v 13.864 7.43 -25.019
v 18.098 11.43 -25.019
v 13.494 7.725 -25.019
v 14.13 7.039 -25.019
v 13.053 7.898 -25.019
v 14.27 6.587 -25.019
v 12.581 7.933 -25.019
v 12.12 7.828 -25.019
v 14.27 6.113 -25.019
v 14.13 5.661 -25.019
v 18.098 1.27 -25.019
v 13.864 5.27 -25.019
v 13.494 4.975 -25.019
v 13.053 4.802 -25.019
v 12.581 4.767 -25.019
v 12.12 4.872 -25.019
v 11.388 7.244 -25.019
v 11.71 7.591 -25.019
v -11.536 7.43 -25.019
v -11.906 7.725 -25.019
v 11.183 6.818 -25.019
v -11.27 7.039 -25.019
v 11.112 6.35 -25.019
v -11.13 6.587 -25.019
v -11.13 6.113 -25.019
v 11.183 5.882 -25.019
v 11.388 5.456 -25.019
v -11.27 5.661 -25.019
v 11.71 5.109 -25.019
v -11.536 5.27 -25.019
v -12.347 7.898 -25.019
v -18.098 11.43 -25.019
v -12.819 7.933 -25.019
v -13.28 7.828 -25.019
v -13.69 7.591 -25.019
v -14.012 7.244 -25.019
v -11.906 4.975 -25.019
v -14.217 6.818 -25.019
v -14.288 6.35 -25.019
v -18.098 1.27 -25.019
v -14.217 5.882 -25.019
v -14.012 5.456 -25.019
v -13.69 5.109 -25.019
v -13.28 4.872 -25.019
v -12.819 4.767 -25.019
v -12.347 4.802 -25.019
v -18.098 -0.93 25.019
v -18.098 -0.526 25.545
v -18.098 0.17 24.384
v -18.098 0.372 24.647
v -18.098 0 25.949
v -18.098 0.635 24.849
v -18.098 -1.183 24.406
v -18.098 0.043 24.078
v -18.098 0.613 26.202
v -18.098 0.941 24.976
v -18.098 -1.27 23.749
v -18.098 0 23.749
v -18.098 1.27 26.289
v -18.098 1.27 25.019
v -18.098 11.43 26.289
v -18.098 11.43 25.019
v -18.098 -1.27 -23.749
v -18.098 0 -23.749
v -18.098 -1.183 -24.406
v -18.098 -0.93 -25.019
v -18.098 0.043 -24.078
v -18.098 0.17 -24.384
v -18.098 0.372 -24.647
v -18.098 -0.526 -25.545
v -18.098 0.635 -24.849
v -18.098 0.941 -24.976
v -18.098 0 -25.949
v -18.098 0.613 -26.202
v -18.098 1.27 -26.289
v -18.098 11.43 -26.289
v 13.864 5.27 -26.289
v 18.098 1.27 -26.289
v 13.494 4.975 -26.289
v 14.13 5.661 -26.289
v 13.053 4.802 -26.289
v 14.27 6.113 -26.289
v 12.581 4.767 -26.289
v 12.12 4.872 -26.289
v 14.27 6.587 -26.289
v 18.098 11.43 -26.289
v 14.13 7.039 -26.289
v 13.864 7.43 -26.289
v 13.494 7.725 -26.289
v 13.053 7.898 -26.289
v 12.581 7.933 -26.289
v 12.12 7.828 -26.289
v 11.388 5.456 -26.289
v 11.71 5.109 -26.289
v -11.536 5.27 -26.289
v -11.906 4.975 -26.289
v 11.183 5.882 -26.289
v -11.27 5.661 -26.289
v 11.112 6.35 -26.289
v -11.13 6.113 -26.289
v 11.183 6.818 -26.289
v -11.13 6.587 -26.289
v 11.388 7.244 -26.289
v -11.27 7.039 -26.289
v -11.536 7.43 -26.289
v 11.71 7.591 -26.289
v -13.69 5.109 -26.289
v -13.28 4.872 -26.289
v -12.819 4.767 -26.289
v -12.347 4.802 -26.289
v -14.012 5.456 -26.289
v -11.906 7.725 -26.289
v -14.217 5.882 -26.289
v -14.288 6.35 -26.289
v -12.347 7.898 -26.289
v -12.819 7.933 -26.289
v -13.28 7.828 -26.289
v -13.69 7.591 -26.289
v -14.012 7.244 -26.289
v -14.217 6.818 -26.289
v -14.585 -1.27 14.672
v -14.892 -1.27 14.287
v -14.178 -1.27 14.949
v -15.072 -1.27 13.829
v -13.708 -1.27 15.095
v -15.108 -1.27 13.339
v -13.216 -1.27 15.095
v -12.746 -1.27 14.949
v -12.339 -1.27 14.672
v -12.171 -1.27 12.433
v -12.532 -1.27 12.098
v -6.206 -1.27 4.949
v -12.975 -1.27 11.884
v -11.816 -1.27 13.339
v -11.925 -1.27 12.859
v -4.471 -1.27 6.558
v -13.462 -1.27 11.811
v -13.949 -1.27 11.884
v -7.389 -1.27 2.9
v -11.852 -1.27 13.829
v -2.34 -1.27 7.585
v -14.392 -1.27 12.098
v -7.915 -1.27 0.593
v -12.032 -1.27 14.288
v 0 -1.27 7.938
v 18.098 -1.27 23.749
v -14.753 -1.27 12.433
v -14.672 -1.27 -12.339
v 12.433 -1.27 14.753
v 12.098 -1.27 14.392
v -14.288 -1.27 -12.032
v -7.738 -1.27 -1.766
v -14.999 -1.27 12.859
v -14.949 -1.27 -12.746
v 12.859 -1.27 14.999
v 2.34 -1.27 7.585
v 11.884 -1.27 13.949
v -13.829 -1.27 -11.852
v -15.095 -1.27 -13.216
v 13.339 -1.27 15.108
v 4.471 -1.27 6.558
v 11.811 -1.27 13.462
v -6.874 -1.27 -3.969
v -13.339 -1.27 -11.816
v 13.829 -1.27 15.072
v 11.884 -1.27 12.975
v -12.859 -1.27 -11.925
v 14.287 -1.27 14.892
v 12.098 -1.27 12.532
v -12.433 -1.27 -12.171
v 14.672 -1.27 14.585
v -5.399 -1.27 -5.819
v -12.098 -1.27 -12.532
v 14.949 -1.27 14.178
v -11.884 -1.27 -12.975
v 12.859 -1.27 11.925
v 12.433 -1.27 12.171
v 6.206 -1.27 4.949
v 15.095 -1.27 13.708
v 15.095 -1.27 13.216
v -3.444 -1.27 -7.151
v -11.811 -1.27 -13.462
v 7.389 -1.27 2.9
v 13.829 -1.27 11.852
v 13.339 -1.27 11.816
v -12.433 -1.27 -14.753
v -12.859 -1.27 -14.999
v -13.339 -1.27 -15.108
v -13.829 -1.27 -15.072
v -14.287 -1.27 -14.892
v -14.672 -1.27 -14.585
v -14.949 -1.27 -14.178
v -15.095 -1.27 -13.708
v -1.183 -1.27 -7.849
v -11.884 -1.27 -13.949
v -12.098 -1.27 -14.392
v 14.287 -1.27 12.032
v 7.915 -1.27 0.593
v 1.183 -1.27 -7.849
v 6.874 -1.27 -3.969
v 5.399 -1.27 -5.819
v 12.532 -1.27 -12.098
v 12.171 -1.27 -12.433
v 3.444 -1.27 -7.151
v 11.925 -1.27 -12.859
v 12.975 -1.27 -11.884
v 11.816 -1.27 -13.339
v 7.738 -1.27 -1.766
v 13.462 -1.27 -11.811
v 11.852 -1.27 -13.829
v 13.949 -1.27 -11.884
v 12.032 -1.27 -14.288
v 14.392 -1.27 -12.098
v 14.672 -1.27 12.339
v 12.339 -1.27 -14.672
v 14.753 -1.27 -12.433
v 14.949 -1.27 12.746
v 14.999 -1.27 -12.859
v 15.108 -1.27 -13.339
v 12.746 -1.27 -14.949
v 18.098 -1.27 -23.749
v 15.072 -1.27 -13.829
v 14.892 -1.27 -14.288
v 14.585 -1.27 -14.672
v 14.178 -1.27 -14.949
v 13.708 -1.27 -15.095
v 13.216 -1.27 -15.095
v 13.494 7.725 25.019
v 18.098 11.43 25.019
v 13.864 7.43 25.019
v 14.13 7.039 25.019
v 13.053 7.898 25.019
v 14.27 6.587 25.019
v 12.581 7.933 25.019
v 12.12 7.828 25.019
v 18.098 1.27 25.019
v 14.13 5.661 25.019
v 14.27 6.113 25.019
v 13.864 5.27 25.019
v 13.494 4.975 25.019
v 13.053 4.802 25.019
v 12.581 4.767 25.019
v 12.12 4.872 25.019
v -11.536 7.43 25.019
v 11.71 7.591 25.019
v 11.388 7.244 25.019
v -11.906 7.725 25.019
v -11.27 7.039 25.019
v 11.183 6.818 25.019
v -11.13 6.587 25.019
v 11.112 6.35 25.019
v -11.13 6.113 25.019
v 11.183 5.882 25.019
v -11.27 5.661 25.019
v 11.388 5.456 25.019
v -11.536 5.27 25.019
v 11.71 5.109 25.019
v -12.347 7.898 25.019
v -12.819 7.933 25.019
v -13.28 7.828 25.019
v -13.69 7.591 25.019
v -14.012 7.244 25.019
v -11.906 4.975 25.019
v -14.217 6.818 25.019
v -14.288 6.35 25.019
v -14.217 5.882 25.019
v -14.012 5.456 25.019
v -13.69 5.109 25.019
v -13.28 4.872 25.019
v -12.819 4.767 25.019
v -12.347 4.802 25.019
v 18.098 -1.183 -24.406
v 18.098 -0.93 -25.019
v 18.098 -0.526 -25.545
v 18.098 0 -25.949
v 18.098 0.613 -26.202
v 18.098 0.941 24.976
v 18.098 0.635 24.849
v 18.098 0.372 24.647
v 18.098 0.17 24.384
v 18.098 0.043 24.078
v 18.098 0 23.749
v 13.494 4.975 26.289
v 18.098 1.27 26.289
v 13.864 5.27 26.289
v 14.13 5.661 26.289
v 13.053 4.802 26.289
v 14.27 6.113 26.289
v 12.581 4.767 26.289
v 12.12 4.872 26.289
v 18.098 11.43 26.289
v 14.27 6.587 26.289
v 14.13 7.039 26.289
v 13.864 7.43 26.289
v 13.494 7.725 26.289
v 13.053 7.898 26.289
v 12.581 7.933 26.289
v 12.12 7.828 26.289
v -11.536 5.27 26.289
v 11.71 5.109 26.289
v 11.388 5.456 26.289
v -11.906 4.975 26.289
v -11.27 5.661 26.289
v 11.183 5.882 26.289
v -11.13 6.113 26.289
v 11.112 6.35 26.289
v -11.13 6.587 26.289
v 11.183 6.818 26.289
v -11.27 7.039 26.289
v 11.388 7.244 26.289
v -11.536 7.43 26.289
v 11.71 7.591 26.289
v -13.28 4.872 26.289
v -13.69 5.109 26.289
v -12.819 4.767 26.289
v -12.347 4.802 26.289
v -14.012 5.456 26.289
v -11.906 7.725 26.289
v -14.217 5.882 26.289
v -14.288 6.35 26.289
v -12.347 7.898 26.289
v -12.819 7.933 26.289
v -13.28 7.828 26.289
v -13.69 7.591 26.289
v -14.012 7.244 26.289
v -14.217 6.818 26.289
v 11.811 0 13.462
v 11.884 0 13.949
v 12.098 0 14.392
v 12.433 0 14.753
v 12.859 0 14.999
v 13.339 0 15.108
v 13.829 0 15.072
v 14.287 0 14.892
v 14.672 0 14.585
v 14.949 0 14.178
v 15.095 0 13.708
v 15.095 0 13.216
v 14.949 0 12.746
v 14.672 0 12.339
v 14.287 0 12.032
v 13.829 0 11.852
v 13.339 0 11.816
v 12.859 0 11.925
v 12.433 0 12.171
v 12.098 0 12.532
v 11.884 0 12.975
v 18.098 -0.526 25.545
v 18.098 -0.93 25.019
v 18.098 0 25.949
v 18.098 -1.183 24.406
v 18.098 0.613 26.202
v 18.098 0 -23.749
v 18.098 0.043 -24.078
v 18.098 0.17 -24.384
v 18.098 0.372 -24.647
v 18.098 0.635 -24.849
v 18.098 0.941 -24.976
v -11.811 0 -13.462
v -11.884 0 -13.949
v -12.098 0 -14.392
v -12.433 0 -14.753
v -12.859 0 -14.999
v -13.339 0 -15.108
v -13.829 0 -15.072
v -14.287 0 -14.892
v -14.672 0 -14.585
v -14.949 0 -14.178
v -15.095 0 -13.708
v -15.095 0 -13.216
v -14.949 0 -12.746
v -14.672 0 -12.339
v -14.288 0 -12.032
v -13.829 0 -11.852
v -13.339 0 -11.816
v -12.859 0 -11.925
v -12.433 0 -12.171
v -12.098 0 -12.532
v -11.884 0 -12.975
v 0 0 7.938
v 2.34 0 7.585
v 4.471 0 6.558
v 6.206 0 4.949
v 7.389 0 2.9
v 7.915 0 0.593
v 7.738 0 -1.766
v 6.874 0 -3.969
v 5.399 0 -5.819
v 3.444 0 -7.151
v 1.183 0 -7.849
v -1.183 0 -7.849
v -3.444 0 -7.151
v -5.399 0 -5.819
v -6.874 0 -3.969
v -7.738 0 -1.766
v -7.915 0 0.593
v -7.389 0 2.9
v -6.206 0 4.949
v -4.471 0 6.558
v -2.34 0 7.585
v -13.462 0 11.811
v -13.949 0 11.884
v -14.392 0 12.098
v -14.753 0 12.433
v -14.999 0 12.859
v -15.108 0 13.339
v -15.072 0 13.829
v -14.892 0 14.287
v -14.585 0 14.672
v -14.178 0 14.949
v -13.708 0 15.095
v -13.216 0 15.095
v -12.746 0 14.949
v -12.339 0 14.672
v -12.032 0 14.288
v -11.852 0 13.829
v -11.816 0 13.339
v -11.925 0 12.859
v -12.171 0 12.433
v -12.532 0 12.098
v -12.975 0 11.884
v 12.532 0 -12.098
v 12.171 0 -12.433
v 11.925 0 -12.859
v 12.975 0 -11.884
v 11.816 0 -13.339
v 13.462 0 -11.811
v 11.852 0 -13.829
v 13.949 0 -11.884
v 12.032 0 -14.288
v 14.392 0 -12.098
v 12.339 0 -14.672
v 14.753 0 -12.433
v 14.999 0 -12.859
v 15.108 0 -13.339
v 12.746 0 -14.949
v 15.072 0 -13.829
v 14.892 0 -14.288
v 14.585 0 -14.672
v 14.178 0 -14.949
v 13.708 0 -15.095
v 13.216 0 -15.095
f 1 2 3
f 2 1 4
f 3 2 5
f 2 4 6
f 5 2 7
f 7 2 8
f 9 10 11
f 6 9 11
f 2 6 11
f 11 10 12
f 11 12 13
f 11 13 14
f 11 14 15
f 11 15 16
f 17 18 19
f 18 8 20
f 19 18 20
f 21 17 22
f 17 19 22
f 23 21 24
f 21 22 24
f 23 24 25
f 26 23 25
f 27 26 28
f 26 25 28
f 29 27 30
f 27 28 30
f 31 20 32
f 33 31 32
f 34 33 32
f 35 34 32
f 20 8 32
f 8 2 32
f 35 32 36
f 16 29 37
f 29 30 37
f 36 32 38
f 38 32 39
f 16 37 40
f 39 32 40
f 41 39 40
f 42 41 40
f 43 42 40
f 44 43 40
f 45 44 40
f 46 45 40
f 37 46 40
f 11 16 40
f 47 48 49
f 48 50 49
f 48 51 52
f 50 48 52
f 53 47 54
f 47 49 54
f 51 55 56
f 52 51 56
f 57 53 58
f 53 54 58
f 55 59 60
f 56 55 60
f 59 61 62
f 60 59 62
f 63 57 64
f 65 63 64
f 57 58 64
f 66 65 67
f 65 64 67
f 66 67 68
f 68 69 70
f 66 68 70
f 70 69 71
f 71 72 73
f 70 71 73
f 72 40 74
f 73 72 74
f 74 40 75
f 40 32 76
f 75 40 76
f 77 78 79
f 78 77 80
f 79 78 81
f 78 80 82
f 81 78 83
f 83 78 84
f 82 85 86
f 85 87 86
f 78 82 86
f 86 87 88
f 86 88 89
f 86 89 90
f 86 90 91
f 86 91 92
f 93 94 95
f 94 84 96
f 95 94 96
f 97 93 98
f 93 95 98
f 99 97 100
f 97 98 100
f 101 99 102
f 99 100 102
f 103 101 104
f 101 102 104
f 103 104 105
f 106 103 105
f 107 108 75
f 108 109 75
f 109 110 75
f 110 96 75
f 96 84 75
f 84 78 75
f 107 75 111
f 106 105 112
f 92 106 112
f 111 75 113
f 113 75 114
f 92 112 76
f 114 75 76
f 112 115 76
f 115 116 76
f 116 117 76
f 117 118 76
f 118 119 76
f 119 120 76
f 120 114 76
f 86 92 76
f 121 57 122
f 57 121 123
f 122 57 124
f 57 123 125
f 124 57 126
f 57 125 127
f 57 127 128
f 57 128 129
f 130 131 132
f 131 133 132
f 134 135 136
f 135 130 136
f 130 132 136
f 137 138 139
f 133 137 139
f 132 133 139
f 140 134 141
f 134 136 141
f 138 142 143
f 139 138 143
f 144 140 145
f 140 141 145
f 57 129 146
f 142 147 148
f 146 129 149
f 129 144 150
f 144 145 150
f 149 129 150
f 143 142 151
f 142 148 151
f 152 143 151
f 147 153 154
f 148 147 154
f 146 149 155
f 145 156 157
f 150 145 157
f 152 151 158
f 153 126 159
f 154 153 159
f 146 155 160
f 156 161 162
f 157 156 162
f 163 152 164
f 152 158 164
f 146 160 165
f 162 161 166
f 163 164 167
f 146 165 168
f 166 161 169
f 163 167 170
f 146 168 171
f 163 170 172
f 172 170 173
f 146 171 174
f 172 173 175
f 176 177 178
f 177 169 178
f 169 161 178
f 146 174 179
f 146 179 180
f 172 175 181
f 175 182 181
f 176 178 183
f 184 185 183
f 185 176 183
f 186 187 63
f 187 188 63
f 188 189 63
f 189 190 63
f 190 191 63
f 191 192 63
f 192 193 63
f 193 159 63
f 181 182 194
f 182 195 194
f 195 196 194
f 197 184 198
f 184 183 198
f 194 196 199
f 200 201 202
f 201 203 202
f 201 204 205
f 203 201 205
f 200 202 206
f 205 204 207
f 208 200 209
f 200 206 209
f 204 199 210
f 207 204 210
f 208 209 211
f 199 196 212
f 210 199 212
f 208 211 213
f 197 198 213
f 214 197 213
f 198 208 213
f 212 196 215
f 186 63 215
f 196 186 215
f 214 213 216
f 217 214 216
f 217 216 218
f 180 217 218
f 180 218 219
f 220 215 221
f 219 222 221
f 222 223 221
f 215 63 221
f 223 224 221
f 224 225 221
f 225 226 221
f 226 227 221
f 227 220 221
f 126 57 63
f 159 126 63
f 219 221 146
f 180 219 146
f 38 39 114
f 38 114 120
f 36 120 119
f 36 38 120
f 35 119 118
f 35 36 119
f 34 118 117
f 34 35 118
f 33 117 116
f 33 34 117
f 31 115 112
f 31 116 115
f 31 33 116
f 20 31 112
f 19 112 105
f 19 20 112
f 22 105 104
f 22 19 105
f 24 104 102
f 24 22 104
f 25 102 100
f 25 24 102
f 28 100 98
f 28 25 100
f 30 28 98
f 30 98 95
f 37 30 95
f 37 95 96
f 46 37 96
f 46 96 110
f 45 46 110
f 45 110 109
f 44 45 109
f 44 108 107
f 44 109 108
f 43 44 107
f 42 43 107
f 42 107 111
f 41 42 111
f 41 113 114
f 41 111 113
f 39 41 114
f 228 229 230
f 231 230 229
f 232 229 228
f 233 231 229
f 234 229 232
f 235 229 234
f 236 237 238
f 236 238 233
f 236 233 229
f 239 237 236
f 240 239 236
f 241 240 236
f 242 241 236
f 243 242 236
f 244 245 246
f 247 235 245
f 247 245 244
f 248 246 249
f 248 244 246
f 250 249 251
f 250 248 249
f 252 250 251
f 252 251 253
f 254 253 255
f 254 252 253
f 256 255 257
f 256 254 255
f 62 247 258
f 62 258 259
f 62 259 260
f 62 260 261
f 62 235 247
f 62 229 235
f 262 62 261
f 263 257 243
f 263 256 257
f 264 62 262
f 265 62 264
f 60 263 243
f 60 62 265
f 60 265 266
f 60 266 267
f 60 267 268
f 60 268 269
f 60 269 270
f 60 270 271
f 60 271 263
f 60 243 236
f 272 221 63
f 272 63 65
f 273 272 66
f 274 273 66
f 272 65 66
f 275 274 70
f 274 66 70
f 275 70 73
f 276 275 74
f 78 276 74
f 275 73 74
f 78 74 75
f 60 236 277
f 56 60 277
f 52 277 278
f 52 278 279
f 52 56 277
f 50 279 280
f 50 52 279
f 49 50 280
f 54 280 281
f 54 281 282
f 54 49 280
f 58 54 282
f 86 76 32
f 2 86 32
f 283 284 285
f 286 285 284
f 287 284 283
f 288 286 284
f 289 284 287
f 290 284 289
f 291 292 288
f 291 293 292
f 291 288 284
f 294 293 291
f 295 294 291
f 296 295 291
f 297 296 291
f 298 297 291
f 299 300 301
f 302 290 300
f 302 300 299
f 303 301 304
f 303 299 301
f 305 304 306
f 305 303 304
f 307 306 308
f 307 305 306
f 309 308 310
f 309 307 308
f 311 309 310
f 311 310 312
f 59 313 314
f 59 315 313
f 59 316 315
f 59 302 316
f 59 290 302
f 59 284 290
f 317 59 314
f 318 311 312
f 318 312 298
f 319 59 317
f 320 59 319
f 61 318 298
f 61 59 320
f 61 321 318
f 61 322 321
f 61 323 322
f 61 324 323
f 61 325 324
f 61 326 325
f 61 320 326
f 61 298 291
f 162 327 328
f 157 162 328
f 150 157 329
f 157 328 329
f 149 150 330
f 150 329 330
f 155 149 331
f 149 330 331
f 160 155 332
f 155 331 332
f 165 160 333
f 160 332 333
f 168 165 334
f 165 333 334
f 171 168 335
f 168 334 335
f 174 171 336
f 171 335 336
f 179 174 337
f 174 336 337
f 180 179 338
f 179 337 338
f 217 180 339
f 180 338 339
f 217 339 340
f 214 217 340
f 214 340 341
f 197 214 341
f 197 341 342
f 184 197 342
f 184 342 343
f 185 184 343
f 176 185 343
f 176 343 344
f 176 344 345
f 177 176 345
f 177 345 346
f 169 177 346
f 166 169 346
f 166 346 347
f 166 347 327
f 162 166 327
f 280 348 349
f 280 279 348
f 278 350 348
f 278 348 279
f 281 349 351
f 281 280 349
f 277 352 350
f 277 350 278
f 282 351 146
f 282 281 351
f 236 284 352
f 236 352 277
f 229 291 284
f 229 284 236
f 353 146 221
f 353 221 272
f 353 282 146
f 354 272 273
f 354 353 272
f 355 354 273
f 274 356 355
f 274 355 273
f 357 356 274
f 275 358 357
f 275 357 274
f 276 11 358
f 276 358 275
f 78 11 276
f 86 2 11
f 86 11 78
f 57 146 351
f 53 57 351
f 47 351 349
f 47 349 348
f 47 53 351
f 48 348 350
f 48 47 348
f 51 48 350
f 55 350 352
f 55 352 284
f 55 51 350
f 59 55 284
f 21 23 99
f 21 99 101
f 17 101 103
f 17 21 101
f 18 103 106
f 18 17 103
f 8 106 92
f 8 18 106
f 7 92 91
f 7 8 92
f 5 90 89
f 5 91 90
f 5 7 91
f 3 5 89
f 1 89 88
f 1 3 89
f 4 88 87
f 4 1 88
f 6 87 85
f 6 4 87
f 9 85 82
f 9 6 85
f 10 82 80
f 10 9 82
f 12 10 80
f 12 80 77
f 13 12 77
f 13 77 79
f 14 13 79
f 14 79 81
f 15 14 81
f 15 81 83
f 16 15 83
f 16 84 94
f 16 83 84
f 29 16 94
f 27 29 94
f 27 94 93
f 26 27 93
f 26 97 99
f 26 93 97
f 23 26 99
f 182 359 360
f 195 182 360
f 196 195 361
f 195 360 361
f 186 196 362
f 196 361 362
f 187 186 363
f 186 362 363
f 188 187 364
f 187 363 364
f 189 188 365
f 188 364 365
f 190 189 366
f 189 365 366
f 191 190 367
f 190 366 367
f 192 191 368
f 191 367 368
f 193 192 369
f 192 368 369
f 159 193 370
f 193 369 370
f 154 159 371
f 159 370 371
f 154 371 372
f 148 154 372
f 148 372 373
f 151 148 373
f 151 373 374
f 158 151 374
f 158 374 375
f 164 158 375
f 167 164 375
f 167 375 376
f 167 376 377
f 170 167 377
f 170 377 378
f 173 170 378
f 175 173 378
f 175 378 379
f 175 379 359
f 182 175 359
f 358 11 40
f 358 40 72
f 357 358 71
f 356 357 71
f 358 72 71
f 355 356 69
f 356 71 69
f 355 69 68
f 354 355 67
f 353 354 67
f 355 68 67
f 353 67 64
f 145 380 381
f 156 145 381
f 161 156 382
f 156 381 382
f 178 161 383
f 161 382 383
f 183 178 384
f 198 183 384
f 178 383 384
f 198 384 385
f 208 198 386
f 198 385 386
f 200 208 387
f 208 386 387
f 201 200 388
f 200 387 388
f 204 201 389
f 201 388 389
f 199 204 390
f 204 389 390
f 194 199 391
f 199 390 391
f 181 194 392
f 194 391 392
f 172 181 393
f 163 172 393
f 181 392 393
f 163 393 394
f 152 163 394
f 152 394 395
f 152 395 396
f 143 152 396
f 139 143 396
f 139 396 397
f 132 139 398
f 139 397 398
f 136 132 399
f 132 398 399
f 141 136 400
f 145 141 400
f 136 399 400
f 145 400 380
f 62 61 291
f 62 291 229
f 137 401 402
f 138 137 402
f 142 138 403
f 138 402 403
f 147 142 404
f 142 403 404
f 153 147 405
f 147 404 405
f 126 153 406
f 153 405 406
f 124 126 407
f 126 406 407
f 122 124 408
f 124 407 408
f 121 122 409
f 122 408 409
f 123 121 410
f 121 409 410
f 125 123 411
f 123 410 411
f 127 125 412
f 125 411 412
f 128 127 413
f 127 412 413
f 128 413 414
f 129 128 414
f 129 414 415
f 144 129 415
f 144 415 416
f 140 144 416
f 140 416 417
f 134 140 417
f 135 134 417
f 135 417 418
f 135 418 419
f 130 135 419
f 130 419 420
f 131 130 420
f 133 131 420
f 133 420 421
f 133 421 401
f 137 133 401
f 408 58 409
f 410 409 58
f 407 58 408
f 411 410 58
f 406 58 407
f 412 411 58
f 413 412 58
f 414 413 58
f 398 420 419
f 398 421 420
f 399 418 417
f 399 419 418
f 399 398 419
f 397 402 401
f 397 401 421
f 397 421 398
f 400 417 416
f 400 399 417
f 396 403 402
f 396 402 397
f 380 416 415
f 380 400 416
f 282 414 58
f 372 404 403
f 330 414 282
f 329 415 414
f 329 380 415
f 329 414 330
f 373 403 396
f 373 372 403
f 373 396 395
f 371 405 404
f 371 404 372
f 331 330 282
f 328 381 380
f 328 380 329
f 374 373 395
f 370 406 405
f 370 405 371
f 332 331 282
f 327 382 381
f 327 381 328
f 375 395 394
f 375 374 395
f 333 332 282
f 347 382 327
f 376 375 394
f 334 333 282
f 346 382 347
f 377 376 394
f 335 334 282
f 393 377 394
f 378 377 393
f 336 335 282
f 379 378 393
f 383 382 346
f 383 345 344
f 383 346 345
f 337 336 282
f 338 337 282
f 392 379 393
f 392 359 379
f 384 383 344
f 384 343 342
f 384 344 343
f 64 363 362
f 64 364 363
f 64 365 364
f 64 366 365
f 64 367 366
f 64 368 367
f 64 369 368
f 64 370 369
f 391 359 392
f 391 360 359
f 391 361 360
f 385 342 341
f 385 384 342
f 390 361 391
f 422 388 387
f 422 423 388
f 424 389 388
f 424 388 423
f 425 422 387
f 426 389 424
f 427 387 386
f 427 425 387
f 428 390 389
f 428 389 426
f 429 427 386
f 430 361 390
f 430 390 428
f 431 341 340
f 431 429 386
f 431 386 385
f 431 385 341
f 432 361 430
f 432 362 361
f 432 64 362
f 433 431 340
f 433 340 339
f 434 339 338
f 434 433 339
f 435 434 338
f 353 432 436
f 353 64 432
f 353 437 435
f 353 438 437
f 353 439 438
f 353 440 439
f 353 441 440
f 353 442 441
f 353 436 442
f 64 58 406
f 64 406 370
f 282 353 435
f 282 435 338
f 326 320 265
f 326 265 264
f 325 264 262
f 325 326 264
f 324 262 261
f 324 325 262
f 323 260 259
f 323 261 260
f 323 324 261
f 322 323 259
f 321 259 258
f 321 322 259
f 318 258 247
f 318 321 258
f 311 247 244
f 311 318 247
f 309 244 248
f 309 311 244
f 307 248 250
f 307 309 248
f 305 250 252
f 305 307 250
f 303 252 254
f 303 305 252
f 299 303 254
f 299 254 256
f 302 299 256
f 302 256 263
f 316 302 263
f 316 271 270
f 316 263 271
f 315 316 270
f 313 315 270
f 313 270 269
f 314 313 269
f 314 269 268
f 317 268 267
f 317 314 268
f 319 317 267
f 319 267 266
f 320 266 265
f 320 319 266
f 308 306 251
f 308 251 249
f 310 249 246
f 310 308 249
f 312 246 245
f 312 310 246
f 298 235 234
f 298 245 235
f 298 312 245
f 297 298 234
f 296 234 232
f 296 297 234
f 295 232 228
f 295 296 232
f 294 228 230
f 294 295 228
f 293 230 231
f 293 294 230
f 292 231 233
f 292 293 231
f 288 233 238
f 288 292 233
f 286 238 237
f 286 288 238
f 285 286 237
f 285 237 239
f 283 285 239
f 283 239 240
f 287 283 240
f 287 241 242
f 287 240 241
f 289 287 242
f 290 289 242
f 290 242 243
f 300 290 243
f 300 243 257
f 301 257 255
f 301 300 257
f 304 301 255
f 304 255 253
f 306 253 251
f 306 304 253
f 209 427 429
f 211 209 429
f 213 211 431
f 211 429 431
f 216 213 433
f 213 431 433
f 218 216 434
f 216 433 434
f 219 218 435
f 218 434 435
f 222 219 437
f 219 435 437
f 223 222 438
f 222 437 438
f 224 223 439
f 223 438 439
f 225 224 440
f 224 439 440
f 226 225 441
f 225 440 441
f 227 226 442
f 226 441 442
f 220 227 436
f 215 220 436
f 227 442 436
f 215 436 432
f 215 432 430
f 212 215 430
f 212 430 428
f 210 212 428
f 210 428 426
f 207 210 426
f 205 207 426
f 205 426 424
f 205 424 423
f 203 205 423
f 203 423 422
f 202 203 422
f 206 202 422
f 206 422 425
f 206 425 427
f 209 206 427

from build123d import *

# Parameters (mm, degrees)
SKETCH1_W                    = 36.195
SKETCH1_H                    = 50.038
SKETCH1_R                    = 7.9375
BASE_FLANGE1_DEPTH           = 1.27
EDGE_FLANGE1_STRIP_W         = 7.62
EDGE_FLANGE1_STRIP_H         = 1.27
EDGE_FLANGE1_STRIP_CUT_DEPTH = 36.195
EDGE_FLANGE1_DEPTH           = 36.195
SKETCH9_R                    = 1.651
CUT_EXTRUDE1_DEPTH           = 34.900972364
CUT_EXTRUDE2_DEPTH           = 57.768041099
CUT_EXTRUDE2_DEPTH_BACK      = 57.768041099
SKETCH10_R                   = 1.5875
CIRPATTERN2_COUNT            = 4


# Sheet-metal steps are written as plain solids
with BuildPart() as part:
    # Sketch1 → Base-Flange1 (new body)
    with BuildSketch(Plane(origin=(0, 0, 0), x_dir=(1, 0, 0), z_dir=(0, 1, 0))):
        Rectangle(SKETCH1_W, SKETCH1_H)
        with Locations(Location((0, 0, 0), (0, 0, 270))):
            Circle(SKETCH1_R, mode=Mode.SUBTRACT)
    extrude(amount=-BASE_FLANGE1_DEPTH)

    # Edge-Flange1 strip (across the edge) → Edge-Flange1 strip cut (cut)
    with BuildSketch(Plane(origin=(-18.0975, 0, 25.019), x_dir=(0, 0, -1), z_dir=(1, 0, 0))):
        with Locations((-2.54, -0.635)):
            Rectangle(EDGE_FLANGE1_STRIP_W, EDGE_FLANGE1_STRIP_H)
    edge_flange1_strip_cut = extrude(amount=EDGE_FLANGE1_STRIP_CUT_DEPTH, mode=Mode.SUBTRACT)

    # Edge-Flange1 section (across the edge) → Edge-Flange1 (add)
    with BuildSketch(Plane(origin=(-18.0975, 0, 25.019), x_dir=(0, 0, -1), z_dir=(1, 0, 0))):
        with BuildLine():
            Line((-1.27, 1.27), (-1.27, 11.43))
            Line((-1.27, 11.43), (0, 11.43))
            Line((0, 11.43), (0, 1.27))
            ThreePointArc((0, 1.27), (0.371974388, 0.371974388), (1.27, 0))
            Line((1.27, 0), (1.27, -1.27))
            ThreePointArc((1.27, -1.27), (-0.526051224, -0.526051224), (-1.27, 1.27))
        make_face()
    edge_flange1 = extrude(amount=EDGE_FLANGE1_DEPTH)

    # Mirror1: Edge-Flange1 strip cut, Edge-Flange1 across plane
    add(edge_flange1_strip_cut.mirror(Plane.XY), mode=Mode.SUBTRACT)
    add(edge_flange1.mirror(Plane.XY))

    # Sketch9 → Cut-Extrude1 (cut, through all)
    with BuildSketch(Plane(origin=(0, 0, 0), x_dir=(1, 0, 0), z_dir=(0, 1, 0))):
        with Locations(Location((13.462, 13.462, 0), (0, 0, 270))):
            Circle(SKETCH9_R)
    cut_extrude1 = extrude(amount=-CUT_EXTRUDE1_DEPTH, mode=Mode.SUBTRACT)

    # Sketch10 → Cut-Extrude2 (cut, two sides: drawn at the far end of the back side and taken through both)
    with BuildSketch(Plane(origin=(0, 0, -26.289), x_dir=(-1, 0, 0), z_dir=(0, 0, -1)).offset(-CUT_EXTRUDE2_DEPTH_BACK)):
        with Locations((-12.7, 6.35)):
            Circle(SKETCH10_R)
        with Locations((12.7, 6.35)):
            Circle(SKETCH10_R)
    extrude(amount=CUT_EXTRUDE2_DEPTH + CUT_EXTRUDE2_DEPTH_BACK, mode=Mode.SUBTRACT)

    # CirPattern2: Cut-Extrude1 ×4 about axis
    cirpattern2_axis = Axis((0, 0, 0), (0, 1, 0))
    for i in range(1, CIRPATTERN2_COUNT):
        add(cut_extrude1.rotate(cirpattern2_axis, i * 360 / CIRPATTERN2_COUNT), mode=Mode.SUBTRACT)


solid = part.part
